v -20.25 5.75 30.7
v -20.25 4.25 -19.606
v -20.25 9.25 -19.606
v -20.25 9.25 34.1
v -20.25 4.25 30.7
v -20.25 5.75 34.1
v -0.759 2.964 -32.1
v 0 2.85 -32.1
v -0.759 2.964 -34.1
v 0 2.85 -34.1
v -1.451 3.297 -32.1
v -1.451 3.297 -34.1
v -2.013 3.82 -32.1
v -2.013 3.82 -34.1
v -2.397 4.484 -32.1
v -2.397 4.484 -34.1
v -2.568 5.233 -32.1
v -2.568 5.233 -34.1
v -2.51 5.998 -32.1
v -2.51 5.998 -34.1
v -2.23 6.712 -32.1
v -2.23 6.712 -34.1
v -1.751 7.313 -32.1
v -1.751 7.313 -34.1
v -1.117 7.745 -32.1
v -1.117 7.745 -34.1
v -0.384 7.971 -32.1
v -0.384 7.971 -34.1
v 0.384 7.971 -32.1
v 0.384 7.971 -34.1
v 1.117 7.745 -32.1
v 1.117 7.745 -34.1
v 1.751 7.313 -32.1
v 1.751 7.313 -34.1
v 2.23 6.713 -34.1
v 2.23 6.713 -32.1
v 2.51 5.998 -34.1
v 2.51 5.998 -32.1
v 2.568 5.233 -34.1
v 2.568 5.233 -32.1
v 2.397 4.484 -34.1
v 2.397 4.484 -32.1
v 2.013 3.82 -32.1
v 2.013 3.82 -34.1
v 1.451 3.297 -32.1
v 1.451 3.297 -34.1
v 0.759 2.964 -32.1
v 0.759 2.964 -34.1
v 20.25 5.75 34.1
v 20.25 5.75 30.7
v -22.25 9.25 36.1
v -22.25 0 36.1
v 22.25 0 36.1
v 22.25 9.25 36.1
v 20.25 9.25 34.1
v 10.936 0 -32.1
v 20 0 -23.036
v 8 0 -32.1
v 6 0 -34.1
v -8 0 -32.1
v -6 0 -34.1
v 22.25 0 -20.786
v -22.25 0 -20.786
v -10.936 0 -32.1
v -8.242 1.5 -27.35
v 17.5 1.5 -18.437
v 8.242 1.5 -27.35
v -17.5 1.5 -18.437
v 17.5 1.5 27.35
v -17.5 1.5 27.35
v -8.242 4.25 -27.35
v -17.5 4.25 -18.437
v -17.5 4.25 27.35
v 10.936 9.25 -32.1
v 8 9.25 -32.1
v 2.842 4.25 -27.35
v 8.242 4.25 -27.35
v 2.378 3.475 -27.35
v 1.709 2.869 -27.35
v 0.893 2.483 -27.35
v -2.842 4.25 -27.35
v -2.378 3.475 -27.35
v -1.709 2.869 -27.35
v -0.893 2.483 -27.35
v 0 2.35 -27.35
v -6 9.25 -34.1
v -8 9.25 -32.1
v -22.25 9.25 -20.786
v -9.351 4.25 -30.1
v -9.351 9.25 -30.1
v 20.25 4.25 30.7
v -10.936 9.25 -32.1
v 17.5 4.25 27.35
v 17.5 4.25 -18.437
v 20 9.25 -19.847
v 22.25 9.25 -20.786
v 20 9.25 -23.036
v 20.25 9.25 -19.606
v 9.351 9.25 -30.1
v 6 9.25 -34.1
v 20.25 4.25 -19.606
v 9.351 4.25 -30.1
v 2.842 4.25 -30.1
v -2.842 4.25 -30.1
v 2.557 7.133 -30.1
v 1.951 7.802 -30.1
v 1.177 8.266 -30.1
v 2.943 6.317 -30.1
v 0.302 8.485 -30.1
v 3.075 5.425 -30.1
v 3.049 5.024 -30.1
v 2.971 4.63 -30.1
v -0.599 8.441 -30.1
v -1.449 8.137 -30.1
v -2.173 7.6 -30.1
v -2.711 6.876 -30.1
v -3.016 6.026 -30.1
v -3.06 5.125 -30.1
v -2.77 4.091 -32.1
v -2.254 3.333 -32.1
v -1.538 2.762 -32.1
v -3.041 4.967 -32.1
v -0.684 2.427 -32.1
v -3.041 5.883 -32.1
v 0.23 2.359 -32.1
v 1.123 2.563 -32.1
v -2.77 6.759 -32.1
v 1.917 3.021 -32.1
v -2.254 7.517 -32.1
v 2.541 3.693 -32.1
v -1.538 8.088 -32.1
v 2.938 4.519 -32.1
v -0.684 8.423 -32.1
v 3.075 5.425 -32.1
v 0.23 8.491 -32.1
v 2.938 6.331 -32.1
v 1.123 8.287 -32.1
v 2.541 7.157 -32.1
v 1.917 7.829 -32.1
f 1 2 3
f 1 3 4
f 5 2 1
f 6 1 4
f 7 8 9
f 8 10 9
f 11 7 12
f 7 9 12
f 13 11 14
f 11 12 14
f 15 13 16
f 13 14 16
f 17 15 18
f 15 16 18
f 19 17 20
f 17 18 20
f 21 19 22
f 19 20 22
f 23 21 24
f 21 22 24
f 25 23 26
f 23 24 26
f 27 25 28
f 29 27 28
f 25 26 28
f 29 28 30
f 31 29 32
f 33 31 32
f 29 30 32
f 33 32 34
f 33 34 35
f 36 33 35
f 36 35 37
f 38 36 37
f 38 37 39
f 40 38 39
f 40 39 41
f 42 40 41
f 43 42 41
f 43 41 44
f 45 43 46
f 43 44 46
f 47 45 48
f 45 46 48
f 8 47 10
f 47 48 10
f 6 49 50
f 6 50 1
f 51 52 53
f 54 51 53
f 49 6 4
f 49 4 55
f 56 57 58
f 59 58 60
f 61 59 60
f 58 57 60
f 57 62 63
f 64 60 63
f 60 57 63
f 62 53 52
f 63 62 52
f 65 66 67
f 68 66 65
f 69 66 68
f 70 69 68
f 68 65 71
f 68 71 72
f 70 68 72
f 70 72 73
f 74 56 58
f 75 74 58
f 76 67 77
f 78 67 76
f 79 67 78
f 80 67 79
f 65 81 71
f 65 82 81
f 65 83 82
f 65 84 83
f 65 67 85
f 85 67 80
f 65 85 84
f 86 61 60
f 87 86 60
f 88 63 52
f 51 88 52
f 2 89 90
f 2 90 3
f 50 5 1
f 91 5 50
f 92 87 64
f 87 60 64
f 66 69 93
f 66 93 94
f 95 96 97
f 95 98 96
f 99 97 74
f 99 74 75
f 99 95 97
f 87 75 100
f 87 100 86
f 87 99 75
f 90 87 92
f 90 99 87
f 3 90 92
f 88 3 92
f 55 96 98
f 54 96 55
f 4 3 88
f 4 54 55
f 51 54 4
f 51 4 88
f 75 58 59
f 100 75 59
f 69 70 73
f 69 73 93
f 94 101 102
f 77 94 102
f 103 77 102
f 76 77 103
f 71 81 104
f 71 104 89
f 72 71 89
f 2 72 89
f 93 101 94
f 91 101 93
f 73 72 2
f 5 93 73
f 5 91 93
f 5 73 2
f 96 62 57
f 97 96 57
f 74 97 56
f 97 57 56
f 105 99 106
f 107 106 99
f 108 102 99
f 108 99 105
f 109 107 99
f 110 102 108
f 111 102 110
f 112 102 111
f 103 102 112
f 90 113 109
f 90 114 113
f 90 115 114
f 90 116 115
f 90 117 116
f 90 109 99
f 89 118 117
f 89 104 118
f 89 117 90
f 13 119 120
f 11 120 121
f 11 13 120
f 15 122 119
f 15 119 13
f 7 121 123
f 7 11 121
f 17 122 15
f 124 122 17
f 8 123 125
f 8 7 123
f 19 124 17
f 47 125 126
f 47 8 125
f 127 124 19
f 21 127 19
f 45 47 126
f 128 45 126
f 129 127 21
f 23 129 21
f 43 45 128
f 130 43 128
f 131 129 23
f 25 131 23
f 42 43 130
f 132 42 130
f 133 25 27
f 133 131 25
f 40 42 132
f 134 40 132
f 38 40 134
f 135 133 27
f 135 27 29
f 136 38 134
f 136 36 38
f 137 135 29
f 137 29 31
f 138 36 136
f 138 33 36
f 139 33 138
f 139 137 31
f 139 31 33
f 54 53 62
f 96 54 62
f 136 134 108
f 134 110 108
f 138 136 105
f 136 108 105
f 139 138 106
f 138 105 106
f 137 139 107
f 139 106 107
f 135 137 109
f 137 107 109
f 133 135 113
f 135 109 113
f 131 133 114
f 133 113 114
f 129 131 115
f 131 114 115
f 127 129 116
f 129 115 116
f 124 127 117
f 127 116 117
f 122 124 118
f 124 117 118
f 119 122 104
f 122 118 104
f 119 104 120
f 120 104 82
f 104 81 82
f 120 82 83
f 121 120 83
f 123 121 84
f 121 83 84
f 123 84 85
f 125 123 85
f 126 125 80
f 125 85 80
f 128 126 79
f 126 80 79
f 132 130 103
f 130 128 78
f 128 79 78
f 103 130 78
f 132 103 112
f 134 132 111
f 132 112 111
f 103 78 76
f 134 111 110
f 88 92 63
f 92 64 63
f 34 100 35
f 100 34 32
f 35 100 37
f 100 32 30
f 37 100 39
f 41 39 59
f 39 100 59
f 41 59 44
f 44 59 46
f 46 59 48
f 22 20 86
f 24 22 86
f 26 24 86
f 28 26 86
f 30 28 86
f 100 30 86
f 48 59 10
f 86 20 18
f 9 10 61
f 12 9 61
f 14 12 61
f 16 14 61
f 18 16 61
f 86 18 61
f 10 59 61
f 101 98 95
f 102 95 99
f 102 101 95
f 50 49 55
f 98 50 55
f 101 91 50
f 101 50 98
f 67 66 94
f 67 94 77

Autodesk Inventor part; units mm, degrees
ref_plane "YZ Plane" through (0, 0, 0) normal (1, 0, 0) x (0, 1, 0)
ref_plane "XZ Plane" through (0, 0, 0) normal (0, 1, 0) x (-1, 0, 0)
ref_plane "XY Plane" through (0, 0, 0) normal (0, 0, 1) x (1, 0, 0)
sketch "Náčrt1" plane through (0, 0, 0) normal (0, 1, 0) x (-1, 0, 0)
  line L0 (20, -19.5) -> (20, 29.85) construction
  line L1 (20, 29.85) -> (-20, 29.85) construction
  line L2 (-20, 29.85) -> (-20, -19.5) construction
  line L3 (-20, -19.5) -> (-9.25, -29.85) construction
  line L4 (-9.25, -29.85) -> (9.25, -29.85) construction
  line L5 (9.25, -29.85) -> (20, -19.5) construction
  line L6 (0, 0) -> (20, 29.85) construction
  line L7 (0, 0) -> (-20, 29.85) construction
  line L8 (0, 0) -> (-20, -29.85) construction
  line L9 (-20, -29.85) -> (-9.25, -29.85) construction
  line L10 (-20, -29.85) -> (-20, -19.5)
  line L11 (17.5, -18.4366) -> (17.5, 27.35)
  line L12 (17.5, 27.35) -> (-17.5, 27.35)
  line L13 (-17.5, 27.35) -> (-17.5, -18.4366)
  line L14 (-17.5, -18.4366) -> (-8.2421, -27.35)
  line L15 (-8.2421, -27.35) -> (8.2421, -27.35)
  line L16 (8.2421, -27.35) -> (17.5, -18.4366)
  line L17 (20.25, -19.6063) -> (20.25, 30.1)
  line L18 (20.25, 30.1) -> (-20.25, 30.1)
  line L19 (-20.25, 30.1) -> (-20.25, -19.6063)
  line L20 (-20.25, -19.6063) -> (-9.3508, -30.1)
  line L21 (-9.3508, -30.1) -> (9.3508, -30.1)
  line L22 (9.3508, -30.1) -> (20.25, -19.6063)
  line L23 (22.25, -20.7863) -> (22.25, 32.1)
  line L24 (22.25, 32.1) -> (-22.25, 32.1) construction
  line L25 (-22.25, 32.1) -> (-22.25, -20.7863)
  line L26 (-22.25, -20.7863) -> (-10.9363, -32.1)
  line L27 (-10.9363, -32.1) -> (10.9363, -32.1)
  line L28 (10.9363, -32.1) -> (22.25, -20.7863)
  line L29 (20.25, 30.1) -> (20.25, 34.1)
  line L30 (20.25, 34.1) -> (-20.25, 34.1)
  line L31 (-20.25, 34.1) -> (-20.25, 30.1)
  line L32 (22.25, 32.1) -> (22.25, 36.1)
  line L33 (22.25, 36.1) -> (-22.25, 36.1)
  line L34 (-22.25, 36.1) -> (-22.25, 32.1)
  line L35 (20.25, 30.7) -> (-20.25, 30.7)
  point P0 (0, -32.1)
  dimension "d0" = 40
  dimension "d1" = 59.7
  dimension "d2" = 18.5
  dimension "d4" = 49.35
  dimension "d6" = 2.5
  dimension "d9" = 4
  dimension "d10" = 2
  dimension "d19" = 0.25
  dimension "d20" = 2
  dimension "d21" = 135
  dimension "d22" = 2
  dimension "d24" = 16
  dimension "d45" = 0.6
extrude "Vysunutí1" add sketch "Náčrt1" along normal blind 1.5 contours L20 L19 L18 L17 L22 L21 | L26 L25 L34 L33 L32 L23 L28 L27 | L31 L35 L29 L18 | L31 L30 L29 L35 | L16 L15 L14 L13 L12 L11
extrude "Vysunutí2" add sketch "Náčrt1" along normal blind 4.25 contours L20 L19 L18 L17 L22 L21 | L31 L35 L29 L18
extrude "Vysunutí3" add sketch "Náčrt1" along normal blind 5.75 contours L31 L30 L29 L35
extrude "Vysunutí4" add sketch "Náčrt1" along normal blind 9.25 contours L26 L25 L34 L33 L32 L23 L28 L27
sketch "Náčrt2" plane through (0, 0, 0) normal (0, -1, 0) x (1, 0, 0)
  line L0 (10.9363, -32.1) -> (-10.9363, -32.1) projected
  line L1 (22.25, -20.7863) -> (10.9363, -32.1) projected
  line L2 (22.25, 36.1) -> (22.25, -20.7863) projected
  line L3 (-22.25, 36.1) -> (22.25, 36.1) projected
  line L4 (-22.25, -20.7863) -> (-22.25, 36.1) projected
  line L5 (-10.9363, -32.1) -> (-22.25, -20.7863) projected
  line L6 (8, -32.1) -> (6, -34.1)
  line L7 (6, -34.1) -> (-6, -34.1)
  line L8 (-6, -34.1) -> (-8, -32.1)
  line L9 (10.9363, -32.1) -> (-10.9363, -32.1) projected
  line L10 (10.9363, -32.1) -> (6, -34.1) construction
  line L11 (-6, -34.1) -> (-10.9363, -32.1) construction
  point P0 (0, 0)
  dimension "d25" = 45
  dimension "d26" = 2
  dimension "d27" = 12
extrude "Vysunutí5" add sketch "Náčrt2" against normal up to surface (9.25 mm away) contours L6 L7 L8 L0
sketch "Náčrt3" plane through (-9.3508, 4.25, -30.1) normal (0, 0, 1) x (1, 0, 0)
  line L0 (18.7016, 0) -> (0, 0) projected
  line L1 (18.7016, 0) -> (18.7016, 5) projected
  line L2 (0, 5) -> (18.7016, 5) projected
  line L3 (0, 0) -> (0, 5) projected
  line L4 (17.5929, -2.75) -> (1.1087, -2.75) projected
  line L5 (17.5929, -2.75) -> (17.5929, 0) projected
  line L6 (1.1087, 0) -> (17.5929, 0) projected
  line L7 (1.1087, -2.75) -> (1.1087, 0) projected
  circle A0 centre (9.3508, 1.175) radius 3.075
  line L8 (3.3508, 5) -> (15.3508, 5) projected
  line L9 (15.3508, -4.25) -> (15.3508, 5) projected
  line L10 (3.3508, -4.25) -> (15.3508, -4.25) projected
  line L11 (3.3508, -4.25) -> (3.3508, 5) projected
  line L12 (29.6008, 1.5) -> (-10.8992, 1.5) projected
  point P0 (9.3508, -4.25)
  point P1 (29.6008, 0.83)
  point P2 (-10.8992, 0.83)
  point P3 (9.3508, 5)
  point P4 (9.3508, 1.5)
  point P5 (9.3508, 5)
  point P6 (9.3508, 0)
  point P7 (9.3508, -2.75)
  point P8 (-10.8992, 1.5)
  dimension "d31" = 6.15
  dimension "d46" = 2.75
extrude "Vysunutí6" cut sketch "Náčrt3" along normal blind 7 and the other way blind 2 contours A0 L0 | L0 A0 L12 | L12 A0
sketch "Náčrt4" plane through (0, 5.425, -32.1) normal (0, 0, 1) x (1, 0, 0)
  circle A0 centre (0, 0) radius 3.075 projected
  point P0 (0, -5.425)
  point P1 (-1.4433, 2.63)
  point P2 (1.4433, 2.63)
  point P3 (-1.199, 2.75)
  point P4 (1.199, 2.75)
hole "Díra1" at (0, 5.425, -32.1) direction (0, 0, -1) diameter 5.15 end through all
equation "\"d10\" = d8"
equation "\"d8\" = 2"
properties part number "rc5_box_2"
